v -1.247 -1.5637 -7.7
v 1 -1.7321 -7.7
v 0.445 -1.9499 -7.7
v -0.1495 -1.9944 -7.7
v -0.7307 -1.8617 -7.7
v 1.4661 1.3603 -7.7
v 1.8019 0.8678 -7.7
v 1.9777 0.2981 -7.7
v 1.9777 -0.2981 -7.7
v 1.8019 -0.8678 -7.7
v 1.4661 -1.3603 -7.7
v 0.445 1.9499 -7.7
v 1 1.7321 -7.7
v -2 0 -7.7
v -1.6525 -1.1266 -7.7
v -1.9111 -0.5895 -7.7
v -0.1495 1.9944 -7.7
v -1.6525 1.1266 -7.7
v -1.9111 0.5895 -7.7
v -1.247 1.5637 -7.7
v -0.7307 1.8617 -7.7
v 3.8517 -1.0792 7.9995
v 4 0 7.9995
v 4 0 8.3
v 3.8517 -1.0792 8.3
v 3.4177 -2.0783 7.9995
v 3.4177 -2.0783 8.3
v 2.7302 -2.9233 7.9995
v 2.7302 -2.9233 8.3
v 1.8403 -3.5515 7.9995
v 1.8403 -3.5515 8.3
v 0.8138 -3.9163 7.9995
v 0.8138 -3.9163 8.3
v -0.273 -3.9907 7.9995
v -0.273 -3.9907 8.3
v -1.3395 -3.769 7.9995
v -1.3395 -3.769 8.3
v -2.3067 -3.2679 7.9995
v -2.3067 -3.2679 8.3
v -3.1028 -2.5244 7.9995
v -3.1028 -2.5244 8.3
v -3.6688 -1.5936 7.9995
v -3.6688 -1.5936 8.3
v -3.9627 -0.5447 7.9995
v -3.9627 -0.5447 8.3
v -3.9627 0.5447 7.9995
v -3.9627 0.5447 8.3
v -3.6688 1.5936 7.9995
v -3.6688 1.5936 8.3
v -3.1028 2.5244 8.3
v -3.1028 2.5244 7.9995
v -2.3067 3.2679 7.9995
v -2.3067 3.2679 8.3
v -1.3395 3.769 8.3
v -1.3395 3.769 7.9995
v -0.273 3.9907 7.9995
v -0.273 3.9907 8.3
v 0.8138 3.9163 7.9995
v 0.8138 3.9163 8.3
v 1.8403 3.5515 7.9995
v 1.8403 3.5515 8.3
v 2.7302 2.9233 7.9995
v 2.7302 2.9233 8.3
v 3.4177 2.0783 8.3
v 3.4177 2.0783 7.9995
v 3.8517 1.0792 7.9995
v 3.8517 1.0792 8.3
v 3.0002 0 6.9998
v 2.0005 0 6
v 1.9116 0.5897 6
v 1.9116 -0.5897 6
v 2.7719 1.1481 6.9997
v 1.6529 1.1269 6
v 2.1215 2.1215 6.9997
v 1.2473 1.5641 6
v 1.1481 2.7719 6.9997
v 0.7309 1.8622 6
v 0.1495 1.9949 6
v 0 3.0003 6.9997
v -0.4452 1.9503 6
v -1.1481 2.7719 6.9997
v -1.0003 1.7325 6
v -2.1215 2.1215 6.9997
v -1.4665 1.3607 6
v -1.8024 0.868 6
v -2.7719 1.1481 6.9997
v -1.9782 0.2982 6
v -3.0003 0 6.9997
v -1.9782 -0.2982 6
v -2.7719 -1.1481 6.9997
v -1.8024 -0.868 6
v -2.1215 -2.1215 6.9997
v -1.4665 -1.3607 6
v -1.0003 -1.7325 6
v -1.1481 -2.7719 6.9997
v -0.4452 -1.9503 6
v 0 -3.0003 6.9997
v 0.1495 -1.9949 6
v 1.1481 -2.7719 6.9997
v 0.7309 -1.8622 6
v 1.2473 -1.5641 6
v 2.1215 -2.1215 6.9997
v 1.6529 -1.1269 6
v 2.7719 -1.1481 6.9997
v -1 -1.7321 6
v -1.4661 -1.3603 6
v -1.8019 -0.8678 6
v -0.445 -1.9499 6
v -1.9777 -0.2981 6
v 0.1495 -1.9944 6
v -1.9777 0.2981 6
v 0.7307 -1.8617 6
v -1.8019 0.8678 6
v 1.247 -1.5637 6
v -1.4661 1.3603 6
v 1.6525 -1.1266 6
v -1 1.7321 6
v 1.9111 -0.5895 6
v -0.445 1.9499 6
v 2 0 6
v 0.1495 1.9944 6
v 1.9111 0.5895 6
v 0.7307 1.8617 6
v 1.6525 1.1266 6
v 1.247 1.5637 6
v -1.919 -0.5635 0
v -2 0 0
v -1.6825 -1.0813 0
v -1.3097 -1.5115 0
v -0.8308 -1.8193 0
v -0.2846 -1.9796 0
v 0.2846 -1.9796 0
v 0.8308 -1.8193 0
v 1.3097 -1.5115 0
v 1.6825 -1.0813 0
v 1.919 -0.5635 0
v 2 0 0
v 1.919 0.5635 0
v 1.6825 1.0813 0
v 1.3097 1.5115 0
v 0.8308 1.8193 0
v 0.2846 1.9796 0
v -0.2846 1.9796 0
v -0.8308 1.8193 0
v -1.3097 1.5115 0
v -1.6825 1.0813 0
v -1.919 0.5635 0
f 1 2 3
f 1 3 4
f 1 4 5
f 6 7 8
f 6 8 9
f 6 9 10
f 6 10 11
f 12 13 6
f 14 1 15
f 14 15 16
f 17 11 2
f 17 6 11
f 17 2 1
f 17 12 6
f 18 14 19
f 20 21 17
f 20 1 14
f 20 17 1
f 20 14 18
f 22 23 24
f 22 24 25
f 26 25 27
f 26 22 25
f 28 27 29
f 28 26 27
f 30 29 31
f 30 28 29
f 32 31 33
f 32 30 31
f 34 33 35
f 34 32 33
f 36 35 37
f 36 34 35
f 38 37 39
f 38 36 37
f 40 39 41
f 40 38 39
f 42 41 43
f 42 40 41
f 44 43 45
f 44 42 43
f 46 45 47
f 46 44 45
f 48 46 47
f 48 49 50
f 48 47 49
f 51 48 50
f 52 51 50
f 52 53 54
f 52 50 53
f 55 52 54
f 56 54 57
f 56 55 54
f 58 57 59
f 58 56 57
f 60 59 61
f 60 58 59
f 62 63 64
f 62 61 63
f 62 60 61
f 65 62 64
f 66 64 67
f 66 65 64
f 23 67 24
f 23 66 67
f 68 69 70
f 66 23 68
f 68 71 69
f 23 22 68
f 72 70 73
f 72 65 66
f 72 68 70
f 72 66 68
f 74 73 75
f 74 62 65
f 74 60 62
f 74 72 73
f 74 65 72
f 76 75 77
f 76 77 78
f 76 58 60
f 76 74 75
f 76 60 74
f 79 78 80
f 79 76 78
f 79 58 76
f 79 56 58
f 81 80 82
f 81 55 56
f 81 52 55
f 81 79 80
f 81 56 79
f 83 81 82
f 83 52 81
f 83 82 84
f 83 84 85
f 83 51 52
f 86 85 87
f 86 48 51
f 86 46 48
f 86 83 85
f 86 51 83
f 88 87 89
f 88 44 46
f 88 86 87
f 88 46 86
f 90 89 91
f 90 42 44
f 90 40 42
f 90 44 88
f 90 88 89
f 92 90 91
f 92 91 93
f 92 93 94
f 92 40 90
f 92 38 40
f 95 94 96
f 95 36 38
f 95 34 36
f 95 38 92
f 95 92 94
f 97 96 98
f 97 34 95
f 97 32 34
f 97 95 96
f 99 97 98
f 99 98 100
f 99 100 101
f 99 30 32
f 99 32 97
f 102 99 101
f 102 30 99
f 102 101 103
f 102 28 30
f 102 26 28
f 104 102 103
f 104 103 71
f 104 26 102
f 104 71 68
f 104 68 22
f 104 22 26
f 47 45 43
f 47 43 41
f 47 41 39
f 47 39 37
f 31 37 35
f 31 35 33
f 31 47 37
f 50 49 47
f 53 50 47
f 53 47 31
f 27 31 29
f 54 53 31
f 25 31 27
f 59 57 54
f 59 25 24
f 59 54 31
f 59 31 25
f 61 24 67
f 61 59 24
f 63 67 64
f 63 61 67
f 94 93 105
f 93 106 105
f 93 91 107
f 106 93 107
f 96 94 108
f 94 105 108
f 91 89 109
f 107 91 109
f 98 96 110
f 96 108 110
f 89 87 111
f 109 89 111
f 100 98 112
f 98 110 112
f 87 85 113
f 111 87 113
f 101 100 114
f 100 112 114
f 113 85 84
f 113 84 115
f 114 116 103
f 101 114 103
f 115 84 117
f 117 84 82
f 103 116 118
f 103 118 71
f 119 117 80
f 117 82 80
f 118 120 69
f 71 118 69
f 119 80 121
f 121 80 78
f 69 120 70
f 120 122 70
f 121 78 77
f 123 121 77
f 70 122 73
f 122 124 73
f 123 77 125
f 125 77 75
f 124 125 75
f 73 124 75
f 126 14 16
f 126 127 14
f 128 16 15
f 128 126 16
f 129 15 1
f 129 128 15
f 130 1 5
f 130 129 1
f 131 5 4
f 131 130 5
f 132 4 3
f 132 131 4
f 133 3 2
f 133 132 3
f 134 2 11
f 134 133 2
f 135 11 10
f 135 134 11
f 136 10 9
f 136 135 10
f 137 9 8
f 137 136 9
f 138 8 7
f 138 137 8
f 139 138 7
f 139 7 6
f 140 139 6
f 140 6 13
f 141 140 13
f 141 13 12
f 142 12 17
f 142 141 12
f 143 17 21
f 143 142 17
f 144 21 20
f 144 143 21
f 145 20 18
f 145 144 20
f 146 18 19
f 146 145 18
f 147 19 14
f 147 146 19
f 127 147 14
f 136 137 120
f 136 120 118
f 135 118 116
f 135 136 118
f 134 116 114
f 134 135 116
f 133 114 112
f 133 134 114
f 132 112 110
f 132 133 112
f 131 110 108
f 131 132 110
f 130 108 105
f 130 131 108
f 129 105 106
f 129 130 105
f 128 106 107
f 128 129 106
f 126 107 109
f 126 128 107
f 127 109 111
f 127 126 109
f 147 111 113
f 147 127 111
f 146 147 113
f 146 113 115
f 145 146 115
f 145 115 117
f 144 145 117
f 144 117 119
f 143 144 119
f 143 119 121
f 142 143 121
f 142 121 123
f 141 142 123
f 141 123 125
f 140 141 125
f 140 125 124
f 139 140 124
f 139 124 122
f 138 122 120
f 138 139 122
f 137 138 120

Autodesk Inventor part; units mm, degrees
ref_plane "YZ Plane" through (0, 0, 0) normal (1, 0, 0) x (0, 1, 0)
ref_plane "XZ Plane" through (0, 0, 0) normal (0, 1, 0) x (-1, 0, 0)
ref_plane "XY Plane" through (0, 0, 0) normal (0, 0, 1) x (1, 0, 0)
sketch "スケッチ1" plane through (0, 0, 0) normal (0, 0, 1) x (1, 0, 0)
  circle A0 centre (0, 0) radius 2
  dimension "d0" = 4
extrude "押し出し1" add sketch "スケッチ1" along normal blind 6
sketch "スケッチ2" plane through (0, 0, 6) normal (0, 0, 1) x (1, 0, 0)
  circle A0 centre (0, 0) radius 2 projected
  circle A1 centre (0, 0) radius 4
  dimension "d3" = 8
extrude "押し出し2" add sketch "スケッチ2" along normal blind 2.3 contours A0 | A1
thread "ねじ1" size "M4x0.7" class "6g" standard "ANSI Metric M Profile" full length
chamfer "面取り1" distance 2 angle 45 1 edges at (-4, 0, 6)
sketch "スケッチ4" plane through (0, 0, 0) normal (0, 0, -1) x (-1, 0, 0)
  circle A0 centre (0, 0) radius 2
extrude "押し出し4" add sketch "スケッチ4" along normal blind 7.7
properties part number "SB　M4 16mm 皿ネジ" material "Stainless Steel, 440C"
